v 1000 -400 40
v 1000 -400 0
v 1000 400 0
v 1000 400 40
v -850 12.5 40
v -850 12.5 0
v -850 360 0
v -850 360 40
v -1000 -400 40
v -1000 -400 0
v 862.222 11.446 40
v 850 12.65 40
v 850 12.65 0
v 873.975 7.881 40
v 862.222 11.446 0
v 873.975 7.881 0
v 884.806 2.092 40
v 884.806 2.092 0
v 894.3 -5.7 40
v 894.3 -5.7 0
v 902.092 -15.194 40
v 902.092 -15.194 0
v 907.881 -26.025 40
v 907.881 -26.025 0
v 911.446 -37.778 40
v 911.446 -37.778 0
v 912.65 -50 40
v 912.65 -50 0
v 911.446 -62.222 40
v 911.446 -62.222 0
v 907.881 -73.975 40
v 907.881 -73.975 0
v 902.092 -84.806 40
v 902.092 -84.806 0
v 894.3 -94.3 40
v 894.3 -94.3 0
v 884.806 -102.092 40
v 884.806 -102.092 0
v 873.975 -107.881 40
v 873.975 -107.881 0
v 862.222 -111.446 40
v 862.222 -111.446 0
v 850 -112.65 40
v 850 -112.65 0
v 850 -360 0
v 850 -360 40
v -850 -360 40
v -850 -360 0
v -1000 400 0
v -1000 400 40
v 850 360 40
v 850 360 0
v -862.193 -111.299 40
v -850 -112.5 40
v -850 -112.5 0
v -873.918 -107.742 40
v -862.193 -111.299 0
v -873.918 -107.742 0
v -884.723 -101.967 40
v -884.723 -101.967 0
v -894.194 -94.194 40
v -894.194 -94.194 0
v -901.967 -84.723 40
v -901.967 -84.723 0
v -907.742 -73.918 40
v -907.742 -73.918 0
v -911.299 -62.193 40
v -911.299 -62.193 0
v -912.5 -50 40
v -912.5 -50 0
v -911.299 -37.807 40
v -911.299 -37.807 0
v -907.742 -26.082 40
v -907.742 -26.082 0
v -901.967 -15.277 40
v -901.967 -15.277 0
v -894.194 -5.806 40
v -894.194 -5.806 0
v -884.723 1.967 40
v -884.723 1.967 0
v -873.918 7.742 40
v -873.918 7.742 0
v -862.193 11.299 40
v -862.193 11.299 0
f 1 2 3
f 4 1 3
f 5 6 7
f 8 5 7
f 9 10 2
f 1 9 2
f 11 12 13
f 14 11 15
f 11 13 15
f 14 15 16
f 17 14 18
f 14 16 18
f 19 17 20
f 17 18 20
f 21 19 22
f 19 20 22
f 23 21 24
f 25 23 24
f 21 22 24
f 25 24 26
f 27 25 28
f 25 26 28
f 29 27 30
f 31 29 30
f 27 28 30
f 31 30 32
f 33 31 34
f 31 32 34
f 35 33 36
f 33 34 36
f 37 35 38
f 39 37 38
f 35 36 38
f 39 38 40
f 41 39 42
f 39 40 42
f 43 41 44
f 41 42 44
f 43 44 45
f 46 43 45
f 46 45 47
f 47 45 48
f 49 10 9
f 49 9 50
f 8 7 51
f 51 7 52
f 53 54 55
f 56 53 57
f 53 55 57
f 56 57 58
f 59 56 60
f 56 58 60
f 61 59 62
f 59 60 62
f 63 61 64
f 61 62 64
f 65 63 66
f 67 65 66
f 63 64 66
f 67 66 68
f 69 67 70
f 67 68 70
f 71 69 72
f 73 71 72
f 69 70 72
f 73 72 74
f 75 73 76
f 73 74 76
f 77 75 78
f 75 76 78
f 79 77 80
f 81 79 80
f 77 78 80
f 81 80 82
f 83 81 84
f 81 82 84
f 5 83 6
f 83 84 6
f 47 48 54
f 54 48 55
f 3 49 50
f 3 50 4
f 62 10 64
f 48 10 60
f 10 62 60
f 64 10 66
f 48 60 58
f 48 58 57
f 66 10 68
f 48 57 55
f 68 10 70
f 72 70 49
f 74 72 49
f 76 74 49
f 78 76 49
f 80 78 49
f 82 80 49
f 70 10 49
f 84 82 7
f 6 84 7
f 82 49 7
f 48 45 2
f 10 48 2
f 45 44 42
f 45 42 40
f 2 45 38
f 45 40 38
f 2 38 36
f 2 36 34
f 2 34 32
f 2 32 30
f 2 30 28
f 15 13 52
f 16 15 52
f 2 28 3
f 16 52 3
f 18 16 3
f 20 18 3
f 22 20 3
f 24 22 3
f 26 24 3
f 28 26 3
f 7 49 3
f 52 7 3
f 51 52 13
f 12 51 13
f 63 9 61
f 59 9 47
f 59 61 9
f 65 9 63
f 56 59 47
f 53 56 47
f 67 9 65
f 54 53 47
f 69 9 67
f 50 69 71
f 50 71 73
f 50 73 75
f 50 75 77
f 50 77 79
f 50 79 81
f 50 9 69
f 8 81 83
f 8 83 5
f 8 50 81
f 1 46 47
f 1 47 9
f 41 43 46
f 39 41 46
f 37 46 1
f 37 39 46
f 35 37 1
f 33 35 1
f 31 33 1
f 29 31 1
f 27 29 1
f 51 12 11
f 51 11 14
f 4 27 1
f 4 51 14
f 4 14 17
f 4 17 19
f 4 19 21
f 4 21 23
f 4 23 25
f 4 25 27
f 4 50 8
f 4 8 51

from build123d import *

# Parameters (mm, degrees)
F0_W     = 2000
F0_H     = 800
F1_DEPTH = 40


with BuildPart() as f1:
    # F0 (on Top) → F1 (new body)
    with BuildSketch(Plane.XY):
        Rectangle(F0_W, F0_H)
        with BuildLine():
            Line((850, -360), (-850, -360))
            Line((-850, -360), (-850, -112.5))
            ThreePointArc((-850, -112.5), (-912.5, -50), (-850, 12.5))
            Line((-850, 12.5), (-850, 360))
            Line((-850, 360), (850, 360))
            Line((850, 360), (850, 12.65))
            ThreePointArc((850, 12.65), (912.65, -50), (850, -112.65))
            Line((850, -112.65), (850, -360))
        make_face(mode=Mode.SUBTRACT)
    extrude(amount=F1_DEPTH)


solid = f1.part
